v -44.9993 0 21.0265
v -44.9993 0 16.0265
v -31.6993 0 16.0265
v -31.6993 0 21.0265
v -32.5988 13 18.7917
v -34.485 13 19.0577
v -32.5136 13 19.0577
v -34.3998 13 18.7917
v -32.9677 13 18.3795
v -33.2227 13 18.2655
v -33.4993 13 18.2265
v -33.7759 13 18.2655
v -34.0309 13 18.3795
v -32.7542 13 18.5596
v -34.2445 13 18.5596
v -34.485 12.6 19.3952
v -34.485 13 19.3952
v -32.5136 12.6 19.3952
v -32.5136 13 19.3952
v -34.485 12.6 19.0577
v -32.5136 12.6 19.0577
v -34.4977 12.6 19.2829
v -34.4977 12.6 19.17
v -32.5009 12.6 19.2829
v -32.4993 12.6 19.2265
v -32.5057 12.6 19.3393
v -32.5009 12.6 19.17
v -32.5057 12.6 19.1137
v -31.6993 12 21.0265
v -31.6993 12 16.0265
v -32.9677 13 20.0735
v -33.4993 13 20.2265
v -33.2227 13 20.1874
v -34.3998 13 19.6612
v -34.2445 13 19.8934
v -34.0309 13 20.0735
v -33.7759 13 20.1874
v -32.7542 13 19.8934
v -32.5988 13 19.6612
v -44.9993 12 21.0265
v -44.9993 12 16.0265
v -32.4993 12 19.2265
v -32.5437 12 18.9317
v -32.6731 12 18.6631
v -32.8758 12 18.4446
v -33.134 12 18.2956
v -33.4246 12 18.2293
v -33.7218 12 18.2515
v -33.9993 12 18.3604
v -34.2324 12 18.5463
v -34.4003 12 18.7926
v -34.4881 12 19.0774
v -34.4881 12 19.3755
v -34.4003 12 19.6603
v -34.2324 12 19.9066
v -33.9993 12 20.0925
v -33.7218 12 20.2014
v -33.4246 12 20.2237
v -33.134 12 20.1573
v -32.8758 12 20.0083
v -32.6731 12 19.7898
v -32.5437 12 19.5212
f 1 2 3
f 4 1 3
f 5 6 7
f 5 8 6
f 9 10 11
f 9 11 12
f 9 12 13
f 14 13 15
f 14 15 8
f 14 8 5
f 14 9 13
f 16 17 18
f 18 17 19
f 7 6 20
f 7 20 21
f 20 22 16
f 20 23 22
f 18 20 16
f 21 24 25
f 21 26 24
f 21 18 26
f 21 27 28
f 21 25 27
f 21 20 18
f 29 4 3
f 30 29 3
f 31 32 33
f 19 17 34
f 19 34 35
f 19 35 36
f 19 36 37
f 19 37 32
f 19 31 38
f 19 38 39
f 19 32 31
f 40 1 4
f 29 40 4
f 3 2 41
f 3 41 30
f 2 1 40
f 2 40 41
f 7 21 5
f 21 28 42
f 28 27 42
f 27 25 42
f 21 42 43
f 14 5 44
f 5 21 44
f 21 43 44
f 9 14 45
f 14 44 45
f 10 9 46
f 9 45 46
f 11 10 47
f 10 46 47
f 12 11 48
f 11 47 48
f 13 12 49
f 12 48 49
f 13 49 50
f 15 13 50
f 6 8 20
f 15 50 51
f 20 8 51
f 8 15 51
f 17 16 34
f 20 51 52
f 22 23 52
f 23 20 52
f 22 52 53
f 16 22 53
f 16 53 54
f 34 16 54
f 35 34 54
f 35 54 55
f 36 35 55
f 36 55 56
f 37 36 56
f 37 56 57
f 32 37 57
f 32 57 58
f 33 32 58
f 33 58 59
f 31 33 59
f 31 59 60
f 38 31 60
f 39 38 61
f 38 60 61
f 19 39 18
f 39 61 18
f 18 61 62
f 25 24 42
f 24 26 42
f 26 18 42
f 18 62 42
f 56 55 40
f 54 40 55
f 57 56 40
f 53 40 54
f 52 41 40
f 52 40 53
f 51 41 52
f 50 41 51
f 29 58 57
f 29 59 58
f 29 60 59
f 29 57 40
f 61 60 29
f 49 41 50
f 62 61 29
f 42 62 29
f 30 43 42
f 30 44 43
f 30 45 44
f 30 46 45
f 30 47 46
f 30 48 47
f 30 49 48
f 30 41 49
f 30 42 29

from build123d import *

# Parameters (mm, degrees)
SKETCH_1_W          = 13.3
SKETCH_1_H          = 5
EXTRUDE_1_DEPTH     = 12
SKETCH_2_R          = 1
EXTRUDE_2_DEPTH     = 1
SKETCH_3_W          = 2.738665781
SKETCH_3_H          = 0.337471602
CUT_EXTRUDE_1_DEPTH = 0.4


with BuildPart() as part:
    # Эскиз1 → Бобышка-Вытянуть1 (new body)
    with BuildSketch(Plane(origin=(0, 0, 0), x_dir=(1, 0, 0), z_dir=(0, 1, 0))):
        with Locations((-38.349307958, -18.52646235)):
            Rectangle(SKETCH_1_W, SKETCH_1_H)
    extrude(amount=EXTRUDE_1_DEPTH)

    # Эскиз2 → Бобышка-Вытянуть2 (add)
    with BuildSketch(Plane(origin=(0, 12, 0), x_dir=(1, 0, 0), z_dir=(0, 1, 0))):
        with Locations((-33.499307958, -19.22646235)):
            Circle(SKETCH_2_R)
    extrude(amount=EXTRUDE_2_DEPTH)

    # Эскиз3 → Вырез-Вытянуть1 (cut)
    with BuildSketch(Plane(origin=(0, 13, 0), x_dir=(1, 0, 0), z_dir=(0, 1, 0))):
        with Locations((-33.499307958, -19.22646235)):
            Rectangle(SKETCH_3_W, SKETCH_3_H)
    extrude(amount=-CUT_EXTRUDE_1_DEPTH, mode=Mode.SUBTRACT)


solid = part.part
